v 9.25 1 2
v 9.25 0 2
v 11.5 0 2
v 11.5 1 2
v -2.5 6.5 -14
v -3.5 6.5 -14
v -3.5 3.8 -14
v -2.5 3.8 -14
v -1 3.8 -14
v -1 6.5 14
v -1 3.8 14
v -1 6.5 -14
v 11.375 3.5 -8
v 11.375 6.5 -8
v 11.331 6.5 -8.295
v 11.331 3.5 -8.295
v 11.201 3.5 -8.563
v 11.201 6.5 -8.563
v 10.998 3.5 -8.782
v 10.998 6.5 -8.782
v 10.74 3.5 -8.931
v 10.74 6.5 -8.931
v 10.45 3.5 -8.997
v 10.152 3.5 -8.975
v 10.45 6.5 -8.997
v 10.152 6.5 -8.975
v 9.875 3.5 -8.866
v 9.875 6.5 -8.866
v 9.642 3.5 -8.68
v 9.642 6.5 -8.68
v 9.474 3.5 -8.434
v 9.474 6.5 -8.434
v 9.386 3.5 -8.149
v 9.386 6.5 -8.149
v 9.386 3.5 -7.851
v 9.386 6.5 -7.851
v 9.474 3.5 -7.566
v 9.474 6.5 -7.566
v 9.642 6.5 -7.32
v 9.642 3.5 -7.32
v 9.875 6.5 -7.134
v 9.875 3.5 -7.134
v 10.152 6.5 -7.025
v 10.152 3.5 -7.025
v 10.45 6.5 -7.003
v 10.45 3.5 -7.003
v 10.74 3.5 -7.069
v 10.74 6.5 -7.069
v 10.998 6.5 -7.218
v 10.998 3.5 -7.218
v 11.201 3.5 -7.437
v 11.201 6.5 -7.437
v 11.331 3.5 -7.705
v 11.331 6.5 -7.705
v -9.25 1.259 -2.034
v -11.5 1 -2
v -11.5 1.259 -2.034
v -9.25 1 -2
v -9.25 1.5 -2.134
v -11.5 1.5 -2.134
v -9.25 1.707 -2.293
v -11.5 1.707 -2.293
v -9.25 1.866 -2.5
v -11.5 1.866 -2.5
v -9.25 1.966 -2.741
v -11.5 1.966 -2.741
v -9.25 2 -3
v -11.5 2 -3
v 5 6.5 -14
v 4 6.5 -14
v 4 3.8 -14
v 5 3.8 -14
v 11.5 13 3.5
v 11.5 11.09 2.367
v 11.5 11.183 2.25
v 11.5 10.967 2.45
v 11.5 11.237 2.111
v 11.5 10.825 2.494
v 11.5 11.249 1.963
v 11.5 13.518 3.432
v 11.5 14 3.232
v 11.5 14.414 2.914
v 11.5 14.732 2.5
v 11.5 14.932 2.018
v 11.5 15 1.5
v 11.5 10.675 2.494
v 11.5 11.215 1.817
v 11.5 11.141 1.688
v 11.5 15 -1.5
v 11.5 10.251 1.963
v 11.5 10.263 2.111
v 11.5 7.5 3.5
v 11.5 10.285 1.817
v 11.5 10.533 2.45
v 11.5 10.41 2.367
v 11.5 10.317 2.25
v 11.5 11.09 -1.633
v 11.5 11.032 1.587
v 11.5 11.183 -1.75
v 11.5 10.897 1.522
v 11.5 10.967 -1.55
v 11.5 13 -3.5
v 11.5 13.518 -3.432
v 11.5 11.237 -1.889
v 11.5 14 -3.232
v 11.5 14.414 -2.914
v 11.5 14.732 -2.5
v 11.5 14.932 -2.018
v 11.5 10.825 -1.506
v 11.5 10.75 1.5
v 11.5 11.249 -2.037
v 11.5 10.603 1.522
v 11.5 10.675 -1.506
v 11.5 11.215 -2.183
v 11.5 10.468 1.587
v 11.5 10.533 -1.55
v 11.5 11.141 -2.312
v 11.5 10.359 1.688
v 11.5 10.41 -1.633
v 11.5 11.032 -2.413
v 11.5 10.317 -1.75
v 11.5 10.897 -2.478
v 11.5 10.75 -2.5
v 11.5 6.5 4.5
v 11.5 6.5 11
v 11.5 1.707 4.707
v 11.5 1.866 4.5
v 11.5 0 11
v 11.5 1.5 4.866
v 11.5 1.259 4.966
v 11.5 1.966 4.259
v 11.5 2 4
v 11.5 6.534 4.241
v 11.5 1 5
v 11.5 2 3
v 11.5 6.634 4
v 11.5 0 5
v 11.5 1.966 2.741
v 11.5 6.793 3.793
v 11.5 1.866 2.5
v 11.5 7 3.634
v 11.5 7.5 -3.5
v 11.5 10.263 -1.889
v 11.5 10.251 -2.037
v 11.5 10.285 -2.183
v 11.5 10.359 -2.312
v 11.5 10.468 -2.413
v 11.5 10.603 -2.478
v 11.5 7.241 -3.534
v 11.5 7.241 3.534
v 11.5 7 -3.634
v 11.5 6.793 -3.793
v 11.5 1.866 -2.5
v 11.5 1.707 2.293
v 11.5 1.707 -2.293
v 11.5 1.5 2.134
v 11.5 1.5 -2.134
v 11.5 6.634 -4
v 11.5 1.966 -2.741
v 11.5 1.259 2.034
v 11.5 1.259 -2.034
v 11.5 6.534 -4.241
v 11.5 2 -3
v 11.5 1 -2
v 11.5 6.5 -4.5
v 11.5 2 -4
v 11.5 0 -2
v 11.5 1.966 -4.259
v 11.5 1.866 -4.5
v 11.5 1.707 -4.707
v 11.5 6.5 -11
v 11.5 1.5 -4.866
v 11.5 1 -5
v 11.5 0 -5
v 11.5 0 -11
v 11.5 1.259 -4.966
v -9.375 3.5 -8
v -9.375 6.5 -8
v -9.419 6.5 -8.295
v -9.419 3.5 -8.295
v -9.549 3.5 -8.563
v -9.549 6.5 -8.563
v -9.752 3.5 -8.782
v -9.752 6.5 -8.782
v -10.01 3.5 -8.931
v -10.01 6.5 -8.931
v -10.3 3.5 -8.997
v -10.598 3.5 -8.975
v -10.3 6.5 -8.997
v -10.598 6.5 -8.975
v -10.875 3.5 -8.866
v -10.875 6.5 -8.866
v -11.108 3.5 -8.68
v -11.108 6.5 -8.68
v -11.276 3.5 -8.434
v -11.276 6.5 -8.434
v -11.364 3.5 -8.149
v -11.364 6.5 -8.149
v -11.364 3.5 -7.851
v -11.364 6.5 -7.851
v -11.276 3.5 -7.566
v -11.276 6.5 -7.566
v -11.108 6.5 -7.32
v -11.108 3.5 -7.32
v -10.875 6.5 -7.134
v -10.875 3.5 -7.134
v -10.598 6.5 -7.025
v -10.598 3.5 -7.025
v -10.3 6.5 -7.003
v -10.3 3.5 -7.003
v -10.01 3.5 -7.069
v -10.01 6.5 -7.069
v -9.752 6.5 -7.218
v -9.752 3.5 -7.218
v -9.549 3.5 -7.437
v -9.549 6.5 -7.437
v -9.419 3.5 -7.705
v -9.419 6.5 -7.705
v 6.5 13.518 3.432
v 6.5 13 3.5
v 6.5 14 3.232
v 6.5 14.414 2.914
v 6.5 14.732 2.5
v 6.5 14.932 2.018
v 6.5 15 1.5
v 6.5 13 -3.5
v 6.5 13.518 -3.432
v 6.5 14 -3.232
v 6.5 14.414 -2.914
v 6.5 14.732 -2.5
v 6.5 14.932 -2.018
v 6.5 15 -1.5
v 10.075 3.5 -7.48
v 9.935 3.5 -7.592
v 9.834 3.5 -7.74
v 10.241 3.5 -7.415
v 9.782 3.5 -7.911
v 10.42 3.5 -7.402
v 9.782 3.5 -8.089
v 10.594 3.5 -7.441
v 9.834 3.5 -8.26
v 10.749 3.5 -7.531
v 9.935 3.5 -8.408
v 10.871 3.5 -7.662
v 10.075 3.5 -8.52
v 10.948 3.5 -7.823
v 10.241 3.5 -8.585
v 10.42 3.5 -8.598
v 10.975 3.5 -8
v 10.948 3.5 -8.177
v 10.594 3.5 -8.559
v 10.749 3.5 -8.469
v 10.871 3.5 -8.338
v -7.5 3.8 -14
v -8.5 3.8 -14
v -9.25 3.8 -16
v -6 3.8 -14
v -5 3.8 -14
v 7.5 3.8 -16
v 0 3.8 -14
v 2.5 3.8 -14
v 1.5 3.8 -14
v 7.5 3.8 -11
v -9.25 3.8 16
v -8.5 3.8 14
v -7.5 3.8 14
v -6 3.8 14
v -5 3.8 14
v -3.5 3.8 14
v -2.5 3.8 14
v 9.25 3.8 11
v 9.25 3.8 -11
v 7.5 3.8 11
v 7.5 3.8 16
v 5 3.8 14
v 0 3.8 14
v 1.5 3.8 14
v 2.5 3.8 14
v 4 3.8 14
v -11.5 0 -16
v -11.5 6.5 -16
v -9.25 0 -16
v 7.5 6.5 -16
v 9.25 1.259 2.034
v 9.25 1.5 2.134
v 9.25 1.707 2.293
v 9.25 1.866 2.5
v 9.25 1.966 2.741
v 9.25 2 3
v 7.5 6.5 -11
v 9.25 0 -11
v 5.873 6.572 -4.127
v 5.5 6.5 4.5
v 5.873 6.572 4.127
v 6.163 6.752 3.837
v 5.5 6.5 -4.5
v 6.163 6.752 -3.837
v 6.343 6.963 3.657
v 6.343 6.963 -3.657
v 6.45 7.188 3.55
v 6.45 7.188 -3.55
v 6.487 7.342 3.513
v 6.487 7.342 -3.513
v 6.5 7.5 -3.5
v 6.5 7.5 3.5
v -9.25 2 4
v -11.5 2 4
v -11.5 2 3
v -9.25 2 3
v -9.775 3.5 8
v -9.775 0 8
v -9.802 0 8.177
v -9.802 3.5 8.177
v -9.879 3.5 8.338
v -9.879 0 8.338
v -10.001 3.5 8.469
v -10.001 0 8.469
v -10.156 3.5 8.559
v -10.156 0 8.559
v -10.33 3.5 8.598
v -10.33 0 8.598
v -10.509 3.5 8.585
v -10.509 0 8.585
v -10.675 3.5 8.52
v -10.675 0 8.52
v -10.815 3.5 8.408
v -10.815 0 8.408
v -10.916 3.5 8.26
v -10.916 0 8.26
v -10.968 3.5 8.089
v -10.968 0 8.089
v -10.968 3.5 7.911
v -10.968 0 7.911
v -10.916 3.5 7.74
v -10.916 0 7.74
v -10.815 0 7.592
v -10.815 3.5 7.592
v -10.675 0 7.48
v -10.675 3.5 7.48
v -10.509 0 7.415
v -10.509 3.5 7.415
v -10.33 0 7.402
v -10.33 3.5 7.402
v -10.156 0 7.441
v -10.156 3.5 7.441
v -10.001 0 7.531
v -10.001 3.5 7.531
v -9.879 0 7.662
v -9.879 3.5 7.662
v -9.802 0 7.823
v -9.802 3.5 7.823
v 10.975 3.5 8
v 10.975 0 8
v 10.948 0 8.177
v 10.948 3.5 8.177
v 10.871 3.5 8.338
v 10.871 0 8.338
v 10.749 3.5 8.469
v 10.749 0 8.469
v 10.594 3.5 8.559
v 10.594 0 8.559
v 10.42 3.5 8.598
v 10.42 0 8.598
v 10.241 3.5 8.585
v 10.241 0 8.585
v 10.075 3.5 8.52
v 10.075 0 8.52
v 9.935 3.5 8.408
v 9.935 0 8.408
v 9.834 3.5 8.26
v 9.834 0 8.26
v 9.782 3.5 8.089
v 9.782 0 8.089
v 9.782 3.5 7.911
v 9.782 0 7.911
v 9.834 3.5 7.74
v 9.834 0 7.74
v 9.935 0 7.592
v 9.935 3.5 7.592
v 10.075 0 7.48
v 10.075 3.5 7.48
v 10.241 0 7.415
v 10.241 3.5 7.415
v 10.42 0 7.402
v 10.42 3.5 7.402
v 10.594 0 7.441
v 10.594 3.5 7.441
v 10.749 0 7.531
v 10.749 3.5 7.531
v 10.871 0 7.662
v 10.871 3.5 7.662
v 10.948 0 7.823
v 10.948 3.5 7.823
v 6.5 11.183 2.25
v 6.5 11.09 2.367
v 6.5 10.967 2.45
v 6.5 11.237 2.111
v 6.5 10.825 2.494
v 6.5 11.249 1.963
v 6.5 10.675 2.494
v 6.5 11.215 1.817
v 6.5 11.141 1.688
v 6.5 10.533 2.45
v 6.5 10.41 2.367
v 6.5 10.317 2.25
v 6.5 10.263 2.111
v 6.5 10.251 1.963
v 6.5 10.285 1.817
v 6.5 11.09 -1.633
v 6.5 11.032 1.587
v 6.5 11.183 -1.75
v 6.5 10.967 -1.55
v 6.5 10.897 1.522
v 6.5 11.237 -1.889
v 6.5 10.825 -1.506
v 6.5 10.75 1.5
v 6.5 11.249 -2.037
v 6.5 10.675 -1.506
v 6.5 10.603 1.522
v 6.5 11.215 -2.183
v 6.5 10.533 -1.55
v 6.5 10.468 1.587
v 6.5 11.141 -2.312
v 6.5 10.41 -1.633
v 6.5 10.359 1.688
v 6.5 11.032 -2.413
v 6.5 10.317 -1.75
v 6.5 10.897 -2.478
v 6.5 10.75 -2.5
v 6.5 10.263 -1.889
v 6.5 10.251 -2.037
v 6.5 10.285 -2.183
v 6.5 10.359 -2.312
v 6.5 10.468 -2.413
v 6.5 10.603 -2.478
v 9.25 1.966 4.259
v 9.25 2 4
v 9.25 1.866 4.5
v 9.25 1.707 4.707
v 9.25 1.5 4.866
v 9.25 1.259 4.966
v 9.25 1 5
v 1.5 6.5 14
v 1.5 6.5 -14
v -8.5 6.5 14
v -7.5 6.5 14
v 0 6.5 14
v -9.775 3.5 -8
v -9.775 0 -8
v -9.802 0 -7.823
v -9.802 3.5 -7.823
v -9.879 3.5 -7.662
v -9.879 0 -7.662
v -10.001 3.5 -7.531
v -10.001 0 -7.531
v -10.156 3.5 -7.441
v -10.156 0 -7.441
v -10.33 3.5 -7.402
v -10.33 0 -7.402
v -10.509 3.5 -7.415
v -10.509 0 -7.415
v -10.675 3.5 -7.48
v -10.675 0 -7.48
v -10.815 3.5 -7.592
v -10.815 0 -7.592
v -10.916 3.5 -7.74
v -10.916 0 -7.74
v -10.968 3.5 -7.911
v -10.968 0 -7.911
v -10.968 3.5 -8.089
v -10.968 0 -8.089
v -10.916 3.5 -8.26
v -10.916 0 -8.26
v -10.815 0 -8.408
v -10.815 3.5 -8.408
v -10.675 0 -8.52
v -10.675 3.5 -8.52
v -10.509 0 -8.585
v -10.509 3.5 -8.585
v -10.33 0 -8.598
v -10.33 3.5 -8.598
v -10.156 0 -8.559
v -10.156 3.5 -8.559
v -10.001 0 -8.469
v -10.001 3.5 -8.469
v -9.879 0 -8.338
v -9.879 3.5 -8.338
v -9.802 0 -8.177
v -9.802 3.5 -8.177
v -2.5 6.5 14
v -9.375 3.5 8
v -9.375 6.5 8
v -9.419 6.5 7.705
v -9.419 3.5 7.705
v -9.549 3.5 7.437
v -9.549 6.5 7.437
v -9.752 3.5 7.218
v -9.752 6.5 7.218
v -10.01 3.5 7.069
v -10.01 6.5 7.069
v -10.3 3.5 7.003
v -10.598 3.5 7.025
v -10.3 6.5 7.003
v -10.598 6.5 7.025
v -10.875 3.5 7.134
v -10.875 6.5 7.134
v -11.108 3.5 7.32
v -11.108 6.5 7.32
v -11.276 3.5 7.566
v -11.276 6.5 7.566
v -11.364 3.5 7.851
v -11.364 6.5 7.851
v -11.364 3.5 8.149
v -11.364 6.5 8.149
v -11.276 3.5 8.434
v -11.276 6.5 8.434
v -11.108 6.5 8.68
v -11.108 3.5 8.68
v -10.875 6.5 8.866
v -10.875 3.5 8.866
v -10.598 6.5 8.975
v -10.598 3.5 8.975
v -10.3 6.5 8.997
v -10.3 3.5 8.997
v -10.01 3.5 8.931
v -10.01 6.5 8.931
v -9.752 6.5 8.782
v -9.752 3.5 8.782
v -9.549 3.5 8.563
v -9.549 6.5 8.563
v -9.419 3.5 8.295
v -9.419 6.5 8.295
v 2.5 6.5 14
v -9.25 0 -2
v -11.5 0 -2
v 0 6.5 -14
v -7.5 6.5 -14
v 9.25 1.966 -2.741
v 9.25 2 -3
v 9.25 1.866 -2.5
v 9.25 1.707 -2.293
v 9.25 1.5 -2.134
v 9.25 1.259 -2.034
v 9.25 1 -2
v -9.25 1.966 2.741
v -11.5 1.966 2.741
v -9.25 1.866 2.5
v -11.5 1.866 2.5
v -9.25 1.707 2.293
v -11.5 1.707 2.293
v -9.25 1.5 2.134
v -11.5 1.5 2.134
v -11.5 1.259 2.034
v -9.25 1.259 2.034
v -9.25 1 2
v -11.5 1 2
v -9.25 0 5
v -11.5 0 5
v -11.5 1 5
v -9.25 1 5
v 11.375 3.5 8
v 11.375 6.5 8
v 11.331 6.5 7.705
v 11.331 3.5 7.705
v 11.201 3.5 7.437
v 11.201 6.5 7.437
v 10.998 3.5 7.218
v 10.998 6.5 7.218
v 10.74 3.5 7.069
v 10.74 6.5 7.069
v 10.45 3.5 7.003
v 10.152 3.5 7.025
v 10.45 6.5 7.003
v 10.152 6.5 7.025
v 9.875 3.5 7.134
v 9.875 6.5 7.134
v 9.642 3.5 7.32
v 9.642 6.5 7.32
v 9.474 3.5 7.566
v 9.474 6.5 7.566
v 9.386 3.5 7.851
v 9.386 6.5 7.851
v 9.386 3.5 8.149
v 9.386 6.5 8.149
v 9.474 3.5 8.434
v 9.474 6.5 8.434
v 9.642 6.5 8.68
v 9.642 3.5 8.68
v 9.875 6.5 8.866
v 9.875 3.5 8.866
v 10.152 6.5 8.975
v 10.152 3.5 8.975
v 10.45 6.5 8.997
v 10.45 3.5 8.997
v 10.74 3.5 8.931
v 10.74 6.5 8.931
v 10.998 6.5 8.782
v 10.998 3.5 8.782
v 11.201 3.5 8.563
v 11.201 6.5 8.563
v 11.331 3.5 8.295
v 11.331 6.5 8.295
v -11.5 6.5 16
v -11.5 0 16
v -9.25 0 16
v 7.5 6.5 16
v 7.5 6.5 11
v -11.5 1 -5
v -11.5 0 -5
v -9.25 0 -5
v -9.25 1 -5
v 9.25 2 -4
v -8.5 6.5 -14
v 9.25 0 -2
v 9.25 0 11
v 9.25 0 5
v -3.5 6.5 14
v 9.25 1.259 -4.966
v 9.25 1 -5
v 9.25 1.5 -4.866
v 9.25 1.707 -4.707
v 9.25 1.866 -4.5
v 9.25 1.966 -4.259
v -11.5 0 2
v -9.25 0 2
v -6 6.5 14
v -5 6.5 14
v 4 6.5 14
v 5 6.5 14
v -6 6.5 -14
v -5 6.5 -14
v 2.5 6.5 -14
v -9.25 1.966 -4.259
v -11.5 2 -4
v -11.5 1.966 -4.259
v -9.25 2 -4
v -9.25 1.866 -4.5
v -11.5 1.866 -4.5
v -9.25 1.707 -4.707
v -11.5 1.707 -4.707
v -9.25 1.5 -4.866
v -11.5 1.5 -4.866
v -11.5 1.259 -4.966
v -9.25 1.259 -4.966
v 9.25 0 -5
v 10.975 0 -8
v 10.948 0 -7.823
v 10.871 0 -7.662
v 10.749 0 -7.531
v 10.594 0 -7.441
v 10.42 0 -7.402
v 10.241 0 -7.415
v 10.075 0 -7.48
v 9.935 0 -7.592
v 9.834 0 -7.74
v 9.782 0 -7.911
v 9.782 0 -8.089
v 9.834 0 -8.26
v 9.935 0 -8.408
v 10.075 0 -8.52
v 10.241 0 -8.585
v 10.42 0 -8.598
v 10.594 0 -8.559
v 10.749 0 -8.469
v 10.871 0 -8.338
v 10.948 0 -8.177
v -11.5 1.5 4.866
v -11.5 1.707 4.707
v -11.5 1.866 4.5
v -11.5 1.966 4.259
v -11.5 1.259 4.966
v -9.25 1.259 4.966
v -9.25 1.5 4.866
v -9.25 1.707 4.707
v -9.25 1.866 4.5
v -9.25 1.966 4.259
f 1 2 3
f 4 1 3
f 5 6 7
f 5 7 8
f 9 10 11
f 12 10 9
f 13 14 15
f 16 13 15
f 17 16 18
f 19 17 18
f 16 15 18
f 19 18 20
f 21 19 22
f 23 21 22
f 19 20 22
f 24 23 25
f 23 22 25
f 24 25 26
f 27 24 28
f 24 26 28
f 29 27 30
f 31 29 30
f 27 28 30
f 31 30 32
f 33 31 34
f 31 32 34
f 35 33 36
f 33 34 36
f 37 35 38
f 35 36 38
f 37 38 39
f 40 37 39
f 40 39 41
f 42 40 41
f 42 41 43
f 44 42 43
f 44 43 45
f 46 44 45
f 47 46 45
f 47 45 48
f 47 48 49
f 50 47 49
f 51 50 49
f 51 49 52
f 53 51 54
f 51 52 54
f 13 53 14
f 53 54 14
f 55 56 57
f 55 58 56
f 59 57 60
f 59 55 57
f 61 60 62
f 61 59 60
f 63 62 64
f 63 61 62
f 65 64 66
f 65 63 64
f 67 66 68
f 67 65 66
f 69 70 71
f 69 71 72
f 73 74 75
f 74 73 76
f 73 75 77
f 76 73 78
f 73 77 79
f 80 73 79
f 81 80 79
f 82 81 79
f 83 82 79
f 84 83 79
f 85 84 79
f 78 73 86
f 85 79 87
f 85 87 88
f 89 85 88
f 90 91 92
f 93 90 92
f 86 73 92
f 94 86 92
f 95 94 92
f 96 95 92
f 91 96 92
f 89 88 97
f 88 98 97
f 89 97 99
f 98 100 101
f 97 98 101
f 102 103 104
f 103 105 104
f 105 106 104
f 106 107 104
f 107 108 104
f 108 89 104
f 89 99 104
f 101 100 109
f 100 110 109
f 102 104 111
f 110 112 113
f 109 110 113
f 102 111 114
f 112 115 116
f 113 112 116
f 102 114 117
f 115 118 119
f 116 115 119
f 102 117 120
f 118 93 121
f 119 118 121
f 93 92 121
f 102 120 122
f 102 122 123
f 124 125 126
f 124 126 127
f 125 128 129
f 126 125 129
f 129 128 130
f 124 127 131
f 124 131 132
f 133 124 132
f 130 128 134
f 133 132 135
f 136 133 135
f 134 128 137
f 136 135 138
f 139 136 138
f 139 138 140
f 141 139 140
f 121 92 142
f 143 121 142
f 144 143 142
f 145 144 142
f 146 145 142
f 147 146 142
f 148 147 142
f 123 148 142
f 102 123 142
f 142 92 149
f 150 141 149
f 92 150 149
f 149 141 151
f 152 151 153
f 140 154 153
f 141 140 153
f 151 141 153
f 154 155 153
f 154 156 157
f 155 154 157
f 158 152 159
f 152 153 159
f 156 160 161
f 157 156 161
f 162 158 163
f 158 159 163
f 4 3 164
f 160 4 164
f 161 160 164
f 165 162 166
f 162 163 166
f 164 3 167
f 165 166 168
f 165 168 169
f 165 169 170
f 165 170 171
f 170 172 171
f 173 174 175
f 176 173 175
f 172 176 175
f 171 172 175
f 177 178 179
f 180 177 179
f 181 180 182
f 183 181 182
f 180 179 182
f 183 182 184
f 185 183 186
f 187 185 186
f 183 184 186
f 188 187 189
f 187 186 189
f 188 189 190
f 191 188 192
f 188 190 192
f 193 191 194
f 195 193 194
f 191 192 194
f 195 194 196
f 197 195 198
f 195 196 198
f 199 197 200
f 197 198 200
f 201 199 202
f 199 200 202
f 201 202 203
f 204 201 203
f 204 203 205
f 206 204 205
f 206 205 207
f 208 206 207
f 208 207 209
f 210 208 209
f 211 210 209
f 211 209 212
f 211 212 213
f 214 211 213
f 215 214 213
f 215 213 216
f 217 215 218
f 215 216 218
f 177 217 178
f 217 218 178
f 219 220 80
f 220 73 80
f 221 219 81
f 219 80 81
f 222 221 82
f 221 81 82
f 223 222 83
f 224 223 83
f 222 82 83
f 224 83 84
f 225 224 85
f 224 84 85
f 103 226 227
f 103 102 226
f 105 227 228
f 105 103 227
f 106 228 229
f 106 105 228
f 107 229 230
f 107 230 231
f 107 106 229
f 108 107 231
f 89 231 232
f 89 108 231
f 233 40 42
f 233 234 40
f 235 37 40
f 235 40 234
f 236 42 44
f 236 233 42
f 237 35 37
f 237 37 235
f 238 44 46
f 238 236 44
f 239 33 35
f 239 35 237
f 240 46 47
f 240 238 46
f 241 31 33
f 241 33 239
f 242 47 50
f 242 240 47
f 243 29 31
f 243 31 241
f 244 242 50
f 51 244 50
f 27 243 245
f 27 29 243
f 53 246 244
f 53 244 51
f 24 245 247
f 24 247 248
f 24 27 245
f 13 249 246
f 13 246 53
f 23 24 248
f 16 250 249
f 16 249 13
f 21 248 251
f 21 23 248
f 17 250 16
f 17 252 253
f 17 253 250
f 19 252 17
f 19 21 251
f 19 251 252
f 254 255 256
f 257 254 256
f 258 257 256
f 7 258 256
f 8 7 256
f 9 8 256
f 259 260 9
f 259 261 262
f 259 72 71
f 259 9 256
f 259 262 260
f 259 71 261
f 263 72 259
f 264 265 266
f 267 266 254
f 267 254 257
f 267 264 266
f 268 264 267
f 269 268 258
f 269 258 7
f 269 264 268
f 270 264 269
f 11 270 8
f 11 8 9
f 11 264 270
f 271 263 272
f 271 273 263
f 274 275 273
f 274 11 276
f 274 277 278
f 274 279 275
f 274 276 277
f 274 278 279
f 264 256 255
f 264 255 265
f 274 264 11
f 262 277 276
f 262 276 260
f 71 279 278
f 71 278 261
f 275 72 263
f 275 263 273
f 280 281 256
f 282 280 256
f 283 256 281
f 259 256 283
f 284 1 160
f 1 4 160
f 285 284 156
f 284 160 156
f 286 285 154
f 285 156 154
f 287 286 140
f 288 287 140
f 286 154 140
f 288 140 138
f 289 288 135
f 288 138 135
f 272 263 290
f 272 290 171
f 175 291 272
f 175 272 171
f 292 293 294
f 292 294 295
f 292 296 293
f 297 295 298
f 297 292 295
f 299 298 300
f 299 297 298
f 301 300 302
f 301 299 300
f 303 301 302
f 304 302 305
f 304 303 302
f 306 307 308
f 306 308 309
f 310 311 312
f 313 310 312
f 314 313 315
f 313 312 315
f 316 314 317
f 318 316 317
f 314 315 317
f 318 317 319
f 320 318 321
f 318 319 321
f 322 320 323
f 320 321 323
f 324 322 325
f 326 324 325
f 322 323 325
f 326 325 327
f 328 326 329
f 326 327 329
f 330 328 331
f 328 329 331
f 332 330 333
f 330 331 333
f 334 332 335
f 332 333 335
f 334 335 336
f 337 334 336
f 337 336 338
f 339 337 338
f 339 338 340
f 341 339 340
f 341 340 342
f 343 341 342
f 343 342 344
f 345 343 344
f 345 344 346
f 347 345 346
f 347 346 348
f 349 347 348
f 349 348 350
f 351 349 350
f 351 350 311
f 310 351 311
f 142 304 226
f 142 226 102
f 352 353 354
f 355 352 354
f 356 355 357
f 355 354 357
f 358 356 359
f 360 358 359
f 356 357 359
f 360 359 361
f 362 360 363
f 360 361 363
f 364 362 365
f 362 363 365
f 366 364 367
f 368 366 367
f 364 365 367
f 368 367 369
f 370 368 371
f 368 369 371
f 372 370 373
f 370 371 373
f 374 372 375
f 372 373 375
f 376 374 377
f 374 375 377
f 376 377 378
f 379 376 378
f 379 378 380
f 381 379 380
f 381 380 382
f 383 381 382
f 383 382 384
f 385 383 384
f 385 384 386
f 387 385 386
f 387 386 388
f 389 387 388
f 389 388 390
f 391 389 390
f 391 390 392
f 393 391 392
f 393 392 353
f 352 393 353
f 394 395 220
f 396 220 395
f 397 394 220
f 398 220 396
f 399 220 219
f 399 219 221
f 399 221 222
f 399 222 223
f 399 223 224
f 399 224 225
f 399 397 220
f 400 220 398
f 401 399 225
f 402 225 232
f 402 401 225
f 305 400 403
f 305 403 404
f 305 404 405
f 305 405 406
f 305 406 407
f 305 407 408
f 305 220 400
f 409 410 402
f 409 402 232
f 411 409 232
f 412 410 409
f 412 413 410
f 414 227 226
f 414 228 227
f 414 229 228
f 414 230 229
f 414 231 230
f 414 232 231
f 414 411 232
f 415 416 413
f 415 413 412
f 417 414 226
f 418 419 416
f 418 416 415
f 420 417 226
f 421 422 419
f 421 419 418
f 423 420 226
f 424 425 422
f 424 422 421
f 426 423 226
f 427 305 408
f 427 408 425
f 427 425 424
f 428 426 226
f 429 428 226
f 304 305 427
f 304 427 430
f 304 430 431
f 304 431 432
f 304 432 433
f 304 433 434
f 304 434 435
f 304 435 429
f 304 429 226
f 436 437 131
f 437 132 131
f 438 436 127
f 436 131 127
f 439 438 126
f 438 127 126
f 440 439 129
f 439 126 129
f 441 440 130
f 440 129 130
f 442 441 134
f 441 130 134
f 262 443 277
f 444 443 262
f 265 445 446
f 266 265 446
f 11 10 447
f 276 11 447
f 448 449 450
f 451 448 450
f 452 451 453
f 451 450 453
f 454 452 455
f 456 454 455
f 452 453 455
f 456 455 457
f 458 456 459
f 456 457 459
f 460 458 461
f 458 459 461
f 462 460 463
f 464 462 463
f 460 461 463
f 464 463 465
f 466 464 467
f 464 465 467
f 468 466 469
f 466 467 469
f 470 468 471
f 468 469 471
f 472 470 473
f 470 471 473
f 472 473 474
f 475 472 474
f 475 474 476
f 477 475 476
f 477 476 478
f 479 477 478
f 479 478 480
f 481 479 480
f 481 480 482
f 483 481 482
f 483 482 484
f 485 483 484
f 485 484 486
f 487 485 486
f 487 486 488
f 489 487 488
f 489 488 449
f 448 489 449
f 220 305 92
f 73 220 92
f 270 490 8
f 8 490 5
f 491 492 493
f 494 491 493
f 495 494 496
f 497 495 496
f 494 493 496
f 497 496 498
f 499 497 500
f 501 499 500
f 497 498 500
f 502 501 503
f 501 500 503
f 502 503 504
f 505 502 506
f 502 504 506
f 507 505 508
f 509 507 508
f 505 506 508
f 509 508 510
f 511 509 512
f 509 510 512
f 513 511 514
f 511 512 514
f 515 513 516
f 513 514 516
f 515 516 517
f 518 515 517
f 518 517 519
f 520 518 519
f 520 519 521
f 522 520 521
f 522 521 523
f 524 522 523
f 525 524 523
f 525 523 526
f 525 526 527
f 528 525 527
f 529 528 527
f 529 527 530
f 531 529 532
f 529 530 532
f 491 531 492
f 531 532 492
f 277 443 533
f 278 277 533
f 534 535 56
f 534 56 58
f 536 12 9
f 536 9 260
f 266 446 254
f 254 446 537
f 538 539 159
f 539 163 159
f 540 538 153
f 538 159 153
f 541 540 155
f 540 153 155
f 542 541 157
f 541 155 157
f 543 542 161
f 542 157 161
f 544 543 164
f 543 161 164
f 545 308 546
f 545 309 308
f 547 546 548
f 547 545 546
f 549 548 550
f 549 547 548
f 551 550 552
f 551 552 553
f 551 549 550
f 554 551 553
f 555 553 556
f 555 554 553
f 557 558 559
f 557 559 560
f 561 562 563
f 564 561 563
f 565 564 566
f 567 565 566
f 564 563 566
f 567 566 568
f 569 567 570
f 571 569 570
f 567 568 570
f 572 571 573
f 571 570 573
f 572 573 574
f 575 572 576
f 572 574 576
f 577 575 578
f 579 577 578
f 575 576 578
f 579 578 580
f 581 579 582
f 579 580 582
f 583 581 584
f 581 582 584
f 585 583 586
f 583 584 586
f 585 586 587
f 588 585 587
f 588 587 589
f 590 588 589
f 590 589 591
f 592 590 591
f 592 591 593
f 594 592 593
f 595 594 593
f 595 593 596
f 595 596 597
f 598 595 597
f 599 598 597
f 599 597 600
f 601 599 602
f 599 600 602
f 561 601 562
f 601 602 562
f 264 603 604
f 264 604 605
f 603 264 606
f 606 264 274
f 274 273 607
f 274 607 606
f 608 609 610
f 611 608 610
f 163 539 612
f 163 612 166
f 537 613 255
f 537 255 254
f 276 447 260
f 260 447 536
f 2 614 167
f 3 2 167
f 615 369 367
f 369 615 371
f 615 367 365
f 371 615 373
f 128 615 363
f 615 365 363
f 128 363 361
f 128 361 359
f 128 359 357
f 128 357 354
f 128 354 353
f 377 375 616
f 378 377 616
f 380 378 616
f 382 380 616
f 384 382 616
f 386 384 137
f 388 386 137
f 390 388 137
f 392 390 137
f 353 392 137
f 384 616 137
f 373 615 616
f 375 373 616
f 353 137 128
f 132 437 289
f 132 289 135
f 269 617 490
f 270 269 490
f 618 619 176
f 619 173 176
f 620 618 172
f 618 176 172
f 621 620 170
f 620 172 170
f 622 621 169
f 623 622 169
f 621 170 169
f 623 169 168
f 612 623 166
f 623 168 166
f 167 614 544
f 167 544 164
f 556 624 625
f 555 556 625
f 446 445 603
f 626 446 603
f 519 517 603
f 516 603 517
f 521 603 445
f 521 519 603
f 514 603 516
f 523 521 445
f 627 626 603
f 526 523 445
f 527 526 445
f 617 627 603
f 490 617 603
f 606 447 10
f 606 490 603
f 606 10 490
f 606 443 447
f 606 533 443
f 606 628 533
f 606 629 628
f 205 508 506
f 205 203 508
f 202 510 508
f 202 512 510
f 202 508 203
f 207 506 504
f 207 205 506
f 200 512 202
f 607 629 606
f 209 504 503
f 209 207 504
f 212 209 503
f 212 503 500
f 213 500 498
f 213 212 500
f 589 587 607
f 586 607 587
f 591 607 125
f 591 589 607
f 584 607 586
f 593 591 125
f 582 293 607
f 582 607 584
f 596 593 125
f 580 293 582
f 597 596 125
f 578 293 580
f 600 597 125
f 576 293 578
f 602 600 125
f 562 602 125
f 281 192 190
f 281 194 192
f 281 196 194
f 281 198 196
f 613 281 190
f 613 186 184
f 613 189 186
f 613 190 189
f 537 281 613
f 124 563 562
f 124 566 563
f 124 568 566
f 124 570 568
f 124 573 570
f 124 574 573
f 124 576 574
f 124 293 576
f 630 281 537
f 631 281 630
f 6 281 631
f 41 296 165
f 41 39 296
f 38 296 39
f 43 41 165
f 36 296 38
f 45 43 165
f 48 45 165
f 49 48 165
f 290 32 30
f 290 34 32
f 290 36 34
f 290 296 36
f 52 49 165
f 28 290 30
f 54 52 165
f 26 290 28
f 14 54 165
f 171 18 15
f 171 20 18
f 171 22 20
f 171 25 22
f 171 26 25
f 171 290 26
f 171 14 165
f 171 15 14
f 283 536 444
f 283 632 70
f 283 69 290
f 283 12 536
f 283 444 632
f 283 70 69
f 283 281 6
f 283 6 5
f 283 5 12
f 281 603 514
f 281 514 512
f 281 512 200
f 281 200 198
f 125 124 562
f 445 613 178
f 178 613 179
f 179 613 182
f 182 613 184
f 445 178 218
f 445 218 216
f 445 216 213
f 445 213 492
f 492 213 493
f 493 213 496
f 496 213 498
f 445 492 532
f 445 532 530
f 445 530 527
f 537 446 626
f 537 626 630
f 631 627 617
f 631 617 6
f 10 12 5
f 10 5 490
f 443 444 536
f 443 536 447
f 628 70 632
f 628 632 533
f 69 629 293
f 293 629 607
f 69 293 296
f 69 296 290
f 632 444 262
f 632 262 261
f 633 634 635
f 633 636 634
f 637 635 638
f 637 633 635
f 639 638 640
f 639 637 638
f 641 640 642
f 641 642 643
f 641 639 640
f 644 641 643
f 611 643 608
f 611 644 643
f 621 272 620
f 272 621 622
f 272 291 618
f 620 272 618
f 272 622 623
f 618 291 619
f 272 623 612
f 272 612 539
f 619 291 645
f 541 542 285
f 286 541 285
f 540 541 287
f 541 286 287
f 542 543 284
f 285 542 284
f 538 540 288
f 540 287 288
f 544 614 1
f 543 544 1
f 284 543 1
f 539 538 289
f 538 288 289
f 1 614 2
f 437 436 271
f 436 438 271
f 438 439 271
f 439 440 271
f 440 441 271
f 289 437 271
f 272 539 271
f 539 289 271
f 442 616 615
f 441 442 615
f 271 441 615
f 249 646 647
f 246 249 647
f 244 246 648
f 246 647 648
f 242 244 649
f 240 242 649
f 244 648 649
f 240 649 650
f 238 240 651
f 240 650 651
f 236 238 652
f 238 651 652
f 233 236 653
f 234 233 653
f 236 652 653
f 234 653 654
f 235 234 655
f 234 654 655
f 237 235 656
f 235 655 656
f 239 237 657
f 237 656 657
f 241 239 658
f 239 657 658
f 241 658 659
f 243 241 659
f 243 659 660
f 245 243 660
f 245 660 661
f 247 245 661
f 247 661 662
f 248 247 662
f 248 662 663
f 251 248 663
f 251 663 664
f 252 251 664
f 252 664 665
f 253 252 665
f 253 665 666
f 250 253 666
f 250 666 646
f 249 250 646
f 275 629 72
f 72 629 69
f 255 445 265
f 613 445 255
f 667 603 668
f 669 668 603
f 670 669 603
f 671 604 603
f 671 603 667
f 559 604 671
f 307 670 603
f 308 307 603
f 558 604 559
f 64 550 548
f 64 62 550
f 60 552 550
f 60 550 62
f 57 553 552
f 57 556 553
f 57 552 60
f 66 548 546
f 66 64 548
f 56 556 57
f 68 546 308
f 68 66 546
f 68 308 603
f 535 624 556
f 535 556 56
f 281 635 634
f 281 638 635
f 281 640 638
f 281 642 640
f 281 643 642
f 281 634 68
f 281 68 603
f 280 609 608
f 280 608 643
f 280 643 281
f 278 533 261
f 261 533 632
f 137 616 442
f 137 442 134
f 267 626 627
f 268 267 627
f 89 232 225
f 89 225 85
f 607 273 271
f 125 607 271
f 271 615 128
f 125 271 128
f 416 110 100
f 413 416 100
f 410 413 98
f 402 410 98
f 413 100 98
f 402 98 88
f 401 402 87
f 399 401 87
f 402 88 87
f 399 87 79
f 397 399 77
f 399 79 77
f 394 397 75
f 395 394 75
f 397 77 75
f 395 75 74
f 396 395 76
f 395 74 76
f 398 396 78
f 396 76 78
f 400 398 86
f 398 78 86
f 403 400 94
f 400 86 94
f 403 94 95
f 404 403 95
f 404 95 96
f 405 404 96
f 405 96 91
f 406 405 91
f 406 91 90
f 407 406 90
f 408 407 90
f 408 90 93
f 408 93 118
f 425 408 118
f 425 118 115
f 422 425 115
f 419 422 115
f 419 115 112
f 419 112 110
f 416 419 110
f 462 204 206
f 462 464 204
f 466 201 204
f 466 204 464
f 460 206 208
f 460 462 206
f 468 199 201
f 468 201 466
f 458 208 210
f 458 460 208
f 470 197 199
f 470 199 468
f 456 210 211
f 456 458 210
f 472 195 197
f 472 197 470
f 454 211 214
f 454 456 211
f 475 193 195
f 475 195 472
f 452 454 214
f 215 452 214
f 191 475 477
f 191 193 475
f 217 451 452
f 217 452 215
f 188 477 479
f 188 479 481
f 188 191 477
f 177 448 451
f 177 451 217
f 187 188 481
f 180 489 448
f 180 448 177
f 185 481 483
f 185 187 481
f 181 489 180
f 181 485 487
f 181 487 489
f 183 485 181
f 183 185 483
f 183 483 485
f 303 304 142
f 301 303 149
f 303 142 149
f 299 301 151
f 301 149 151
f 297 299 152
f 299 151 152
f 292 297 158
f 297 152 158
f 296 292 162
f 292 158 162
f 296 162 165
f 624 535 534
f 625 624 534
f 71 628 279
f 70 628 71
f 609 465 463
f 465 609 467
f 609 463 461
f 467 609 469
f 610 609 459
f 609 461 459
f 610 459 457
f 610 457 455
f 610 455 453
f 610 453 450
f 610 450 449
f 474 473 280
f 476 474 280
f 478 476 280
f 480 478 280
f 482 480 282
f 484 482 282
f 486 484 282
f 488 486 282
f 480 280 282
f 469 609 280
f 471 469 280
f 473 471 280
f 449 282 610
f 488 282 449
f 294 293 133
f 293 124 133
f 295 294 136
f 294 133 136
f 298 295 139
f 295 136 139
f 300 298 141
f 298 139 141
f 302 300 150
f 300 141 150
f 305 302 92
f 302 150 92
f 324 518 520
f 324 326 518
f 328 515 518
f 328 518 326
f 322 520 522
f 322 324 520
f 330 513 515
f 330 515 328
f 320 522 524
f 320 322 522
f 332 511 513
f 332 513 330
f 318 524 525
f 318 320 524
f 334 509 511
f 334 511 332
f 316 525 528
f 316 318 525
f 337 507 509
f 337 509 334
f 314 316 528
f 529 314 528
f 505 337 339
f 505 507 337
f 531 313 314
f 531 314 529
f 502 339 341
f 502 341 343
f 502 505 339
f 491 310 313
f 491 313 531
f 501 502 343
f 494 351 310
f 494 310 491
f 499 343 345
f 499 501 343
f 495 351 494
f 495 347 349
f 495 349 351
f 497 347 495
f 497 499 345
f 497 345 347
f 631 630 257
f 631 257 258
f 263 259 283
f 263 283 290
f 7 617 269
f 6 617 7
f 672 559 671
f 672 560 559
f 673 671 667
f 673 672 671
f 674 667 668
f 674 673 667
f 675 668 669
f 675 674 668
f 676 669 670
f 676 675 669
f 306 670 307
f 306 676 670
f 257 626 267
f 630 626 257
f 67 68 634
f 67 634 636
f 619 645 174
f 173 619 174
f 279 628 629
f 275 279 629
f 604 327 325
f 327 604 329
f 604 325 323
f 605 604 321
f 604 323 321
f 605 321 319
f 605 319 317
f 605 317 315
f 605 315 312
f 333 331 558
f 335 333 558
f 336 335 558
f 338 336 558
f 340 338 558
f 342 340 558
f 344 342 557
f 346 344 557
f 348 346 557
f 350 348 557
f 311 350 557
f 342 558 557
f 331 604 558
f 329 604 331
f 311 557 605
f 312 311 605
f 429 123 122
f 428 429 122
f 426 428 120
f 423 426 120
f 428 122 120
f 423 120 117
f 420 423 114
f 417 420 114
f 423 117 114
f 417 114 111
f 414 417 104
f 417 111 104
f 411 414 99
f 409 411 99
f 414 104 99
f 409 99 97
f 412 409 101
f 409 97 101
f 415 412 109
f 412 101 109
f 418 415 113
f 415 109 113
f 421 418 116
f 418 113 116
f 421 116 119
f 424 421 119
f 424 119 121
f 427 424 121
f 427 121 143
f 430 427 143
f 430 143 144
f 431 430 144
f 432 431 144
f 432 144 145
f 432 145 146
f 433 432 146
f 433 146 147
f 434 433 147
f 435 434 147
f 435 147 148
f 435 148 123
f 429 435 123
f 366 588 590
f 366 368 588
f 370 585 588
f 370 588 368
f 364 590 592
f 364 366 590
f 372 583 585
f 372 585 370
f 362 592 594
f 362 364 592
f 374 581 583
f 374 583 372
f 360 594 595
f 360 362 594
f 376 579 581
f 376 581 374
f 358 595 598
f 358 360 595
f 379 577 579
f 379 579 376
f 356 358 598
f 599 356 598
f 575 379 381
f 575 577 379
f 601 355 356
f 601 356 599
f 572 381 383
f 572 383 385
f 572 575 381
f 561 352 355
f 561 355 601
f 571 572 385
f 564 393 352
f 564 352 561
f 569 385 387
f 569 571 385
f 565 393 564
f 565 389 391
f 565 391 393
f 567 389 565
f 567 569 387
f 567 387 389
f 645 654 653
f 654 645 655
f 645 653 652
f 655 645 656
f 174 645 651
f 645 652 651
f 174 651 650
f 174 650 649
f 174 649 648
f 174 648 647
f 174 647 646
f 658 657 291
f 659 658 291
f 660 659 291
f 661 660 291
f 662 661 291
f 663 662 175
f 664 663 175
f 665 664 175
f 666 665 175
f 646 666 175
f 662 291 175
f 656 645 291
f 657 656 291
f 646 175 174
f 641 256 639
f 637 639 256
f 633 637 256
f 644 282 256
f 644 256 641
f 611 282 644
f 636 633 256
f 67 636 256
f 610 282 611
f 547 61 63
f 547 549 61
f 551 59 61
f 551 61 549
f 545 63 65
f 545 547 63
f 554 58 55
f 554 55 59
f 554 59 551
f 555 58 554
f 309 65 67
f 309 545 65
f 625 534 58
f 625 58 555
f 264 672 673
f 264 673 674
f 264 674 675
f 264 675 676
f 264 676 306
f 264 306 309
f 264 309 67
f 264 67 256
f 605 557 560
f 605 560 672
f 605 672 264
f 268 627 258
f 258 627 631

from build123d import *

# Parameters (mm, degrees)
SKETCH_1_W          = 23
SKETCH_1_H          = 32
EXTRUDE_1_DEPTH     = 6.5
SKETCH_3_W          = 18.5
SKETCH_3_H          = 32
CUT_EXTRUDE_1_DEPTH = 3.8
SKETCH_4_W          = 23.00306398
SKETCH_4_H          = 3
CUT_EXTRUDE_2_DEPTH = 2
SKETCH_5_R          = 0.6
CUT_EXTRUDE_3_DEPTH = 7.5
SKETCH_6_W          = 5
SKETCH_6_H          = 7
EXTRUDE_2_DEPTH     = 8.5
FILLET_1_R          = 1
SKETCH_7_R          = 0.5
CUT_EXTRUDE_4_DEPTH = 24
FILLET_2_R          = 2
FILLET_3_R          = 1
SKETCH_8_W          = 4
SKETCH_8_H          = 5
CUT_EXTRUDE_5_DEPTH = 16
SKETCH_9_R          = 1
CUT_EXTRUDE_6_DEPTH = 3
SKETCH_10_W         = 1
SKETCH_10_H         = 28
CUT_EXTRUDE_7_DEPTH = 7.5


with BuildPart() as part:
    # 草图1 → 凸台-拉伸1 (new body)
    with BuildSketch(Plane(origin=(0, 0, 0), x_dir=(1, 0, 0), z_dir=(0, 1, 0))):
        Rectangle(SKETCH_1_W, SKETCH_1_H)
    extrude(amount=EXTRUDE_1_DEPTH)

    # 草图3 → 切除-拉伸1 (cut)
    with BuildSketch(Plane.XZ):
        Rectangle(SKETCH_3_W, SKETCH_3_H)
    extrude(amount=-CUT_EXTRUDE_1_DEPTH, mode=Mode.SUBTRACT)

    # 草图4 → 切除-拉伸2 (cut)
    with BuildSketch(Plane.XZ):
        with Locations((0.00153199, 3.5)):
            Rectangle(SKETCH_4_W, SKETCH_4_H)
        with Locations((0.00153199, -3.5)):
            Rectangle(SKETCH_4_W, SKETCH_4_H)
    extrude(amount=-CUT_EXTRUDE_2_DEPTH, mode=Mode.SUBTRACT)

    # 草图5 → 切除-拉伸3 (cut, through all)
    with BuildSketch(Plane.XZ):
        with Locations((-10.375, -8)):
            Circle(SKETCH_5_R)
        with Locations((10.375, -8)):
            Circle(SKETCH_5_R)
        with Locations((10.375, 8)):
            Circle(SKETCH_5_R)
        with Locations((-10.375, 8)):
            Circle(SKETCH_5_R)
    extrude(amount=-CUT_EXTRUDE_3_DEPTH, mode=Mode.SUBTRACT)

    # 草图6 → 凸台-拉伸2 (add)
    with BuildSketch(Plane(origin=(0, 6.5, 0), x_dir=(1, 0, 0), z_dir=(0, 1, 0))):
        with Locations((9, 0)):
            Rectangle(SKETCH_6_W, SKETCH_6_H)
    extrude(amount=EXTRUDE_2_DEPTH)

    # 圆角1
    fillet_1_edges = [part.edges().sort_by_distance(p)[0] for p in [
        (10.375, 2, 5),
        (-10.375, 2, 5),
        (10.375, 2, 2),
        (-10.375, 2, 2),
        (10.375, 2, -5),
        (-10.375, 2, -5),
        (10.375, 2, -2),
        (-10.375, 2, -2),
    ]]
    fillet(fillet_1_edges, radius=FILLET_1_R)

    # 草图7 → 切除-拉伸4 (cut, through all)
    with BuildSketch(Plane(origin=(11.5, 0, 0), x_dir=(0, 0, -1), z_dir=(1, 0, 0))):
        with Locations((-2, 10.75)):
            Circle(SKETCH_7_R)
        with Locations((2, 10.75)):
            Circle(SKETCH_7_R)
    extrude(amount=-CUT_EXTRUDE_4_DEPTH, mode=Mode.SUBTRACT)

    # 圆角2
    fillet_2_edges = [part.edges().sort_by_distance(p)[0] for p in [
        (9, 15, 3.5),
        (9, 15, -3.5),
    ]]
    fillet(fillet_2_edges, radius=FILLET_2_R)

    # 圆角3
    fillet_3_edges = [part.edges().sort_by_distance(p)[0] for p in [
        (6.5, 6.5, 0),
        (9, 6.5, 3.5),
        (9, 6.5, -3.5),
    ]]
    fillet(fillet_3_edges, radius=FILLET_3_R)

    # 草图8 → 切除-拉伸5 (cut, through all)
    with BuildSketch(Plane.XZ):
        with Locations((9.5, 13.5)):
            Rectangle(SKETCH_8_W, SKETCH_8_H)
        with Locations((9.5, -13.5)):
            Rectangle(SKETCH_8_W, SKETCH_8_H)
    extrude(amount=-CUT_EXTRUDE_5_DEPTH, mode=Mode.SUBTRACT)

    # 草图9 → 切除-拉伸6 (cut)
    with BuildSketch(Plane(origin=(0, 6.5, 0), x_dir=(1, 0, 0), z_dir=(0, 1, 0))):
        with Locations((-10.375, 8)):
            Circle(SKETCH_9_R)
        with Locations((10.375, 8)):
            Circle(SKETCH_9_R)
        with Locations((-10.375, -8)):
            Circle(SKETCH_9_R)
        with Locations((10.375, -8)):
            Circle(SKETCH_9_R)
    extrude(amount=-CUT_EXTRUDE_6_DEPTH, mode=Mode.SUBTRACT)

    # 草图10 → 切除-拉伸7 (cut, through all)
    with BuildSketch(Plane(origin=(0, 6.5, 0), x_dir=(1, 0, 0), z_dir=(0, 1, 0))):
        with Locations((-8, 0)):
            Rectangle(SKETCH_10_W, SKETCH_10_H)
        with Locations((-5.5, 0)):
            Rectangle(SKETCH_10_W, SKETCH_10_H)
        with Locations((-3, 0)):
            Rectangle(SKETCH_10_W, SKETCH_10_H)
        with Locations((-0.5, 0)):
            Rectangle(SKETCH_10_W, SKETCH_10_H)
        with Locations((2, 0)):
            Rectangle(SKETCH_10_W, SKETCH_10_H)
        with Locations((4.5, 0)):
            Rectangle(SKETCH_10_W, SKETCH_10_H)
    extrude(amount=-CUT_EXTRUDE_7_DEPTH, mode=Mode.SUBTRACT)


solid = part.part
